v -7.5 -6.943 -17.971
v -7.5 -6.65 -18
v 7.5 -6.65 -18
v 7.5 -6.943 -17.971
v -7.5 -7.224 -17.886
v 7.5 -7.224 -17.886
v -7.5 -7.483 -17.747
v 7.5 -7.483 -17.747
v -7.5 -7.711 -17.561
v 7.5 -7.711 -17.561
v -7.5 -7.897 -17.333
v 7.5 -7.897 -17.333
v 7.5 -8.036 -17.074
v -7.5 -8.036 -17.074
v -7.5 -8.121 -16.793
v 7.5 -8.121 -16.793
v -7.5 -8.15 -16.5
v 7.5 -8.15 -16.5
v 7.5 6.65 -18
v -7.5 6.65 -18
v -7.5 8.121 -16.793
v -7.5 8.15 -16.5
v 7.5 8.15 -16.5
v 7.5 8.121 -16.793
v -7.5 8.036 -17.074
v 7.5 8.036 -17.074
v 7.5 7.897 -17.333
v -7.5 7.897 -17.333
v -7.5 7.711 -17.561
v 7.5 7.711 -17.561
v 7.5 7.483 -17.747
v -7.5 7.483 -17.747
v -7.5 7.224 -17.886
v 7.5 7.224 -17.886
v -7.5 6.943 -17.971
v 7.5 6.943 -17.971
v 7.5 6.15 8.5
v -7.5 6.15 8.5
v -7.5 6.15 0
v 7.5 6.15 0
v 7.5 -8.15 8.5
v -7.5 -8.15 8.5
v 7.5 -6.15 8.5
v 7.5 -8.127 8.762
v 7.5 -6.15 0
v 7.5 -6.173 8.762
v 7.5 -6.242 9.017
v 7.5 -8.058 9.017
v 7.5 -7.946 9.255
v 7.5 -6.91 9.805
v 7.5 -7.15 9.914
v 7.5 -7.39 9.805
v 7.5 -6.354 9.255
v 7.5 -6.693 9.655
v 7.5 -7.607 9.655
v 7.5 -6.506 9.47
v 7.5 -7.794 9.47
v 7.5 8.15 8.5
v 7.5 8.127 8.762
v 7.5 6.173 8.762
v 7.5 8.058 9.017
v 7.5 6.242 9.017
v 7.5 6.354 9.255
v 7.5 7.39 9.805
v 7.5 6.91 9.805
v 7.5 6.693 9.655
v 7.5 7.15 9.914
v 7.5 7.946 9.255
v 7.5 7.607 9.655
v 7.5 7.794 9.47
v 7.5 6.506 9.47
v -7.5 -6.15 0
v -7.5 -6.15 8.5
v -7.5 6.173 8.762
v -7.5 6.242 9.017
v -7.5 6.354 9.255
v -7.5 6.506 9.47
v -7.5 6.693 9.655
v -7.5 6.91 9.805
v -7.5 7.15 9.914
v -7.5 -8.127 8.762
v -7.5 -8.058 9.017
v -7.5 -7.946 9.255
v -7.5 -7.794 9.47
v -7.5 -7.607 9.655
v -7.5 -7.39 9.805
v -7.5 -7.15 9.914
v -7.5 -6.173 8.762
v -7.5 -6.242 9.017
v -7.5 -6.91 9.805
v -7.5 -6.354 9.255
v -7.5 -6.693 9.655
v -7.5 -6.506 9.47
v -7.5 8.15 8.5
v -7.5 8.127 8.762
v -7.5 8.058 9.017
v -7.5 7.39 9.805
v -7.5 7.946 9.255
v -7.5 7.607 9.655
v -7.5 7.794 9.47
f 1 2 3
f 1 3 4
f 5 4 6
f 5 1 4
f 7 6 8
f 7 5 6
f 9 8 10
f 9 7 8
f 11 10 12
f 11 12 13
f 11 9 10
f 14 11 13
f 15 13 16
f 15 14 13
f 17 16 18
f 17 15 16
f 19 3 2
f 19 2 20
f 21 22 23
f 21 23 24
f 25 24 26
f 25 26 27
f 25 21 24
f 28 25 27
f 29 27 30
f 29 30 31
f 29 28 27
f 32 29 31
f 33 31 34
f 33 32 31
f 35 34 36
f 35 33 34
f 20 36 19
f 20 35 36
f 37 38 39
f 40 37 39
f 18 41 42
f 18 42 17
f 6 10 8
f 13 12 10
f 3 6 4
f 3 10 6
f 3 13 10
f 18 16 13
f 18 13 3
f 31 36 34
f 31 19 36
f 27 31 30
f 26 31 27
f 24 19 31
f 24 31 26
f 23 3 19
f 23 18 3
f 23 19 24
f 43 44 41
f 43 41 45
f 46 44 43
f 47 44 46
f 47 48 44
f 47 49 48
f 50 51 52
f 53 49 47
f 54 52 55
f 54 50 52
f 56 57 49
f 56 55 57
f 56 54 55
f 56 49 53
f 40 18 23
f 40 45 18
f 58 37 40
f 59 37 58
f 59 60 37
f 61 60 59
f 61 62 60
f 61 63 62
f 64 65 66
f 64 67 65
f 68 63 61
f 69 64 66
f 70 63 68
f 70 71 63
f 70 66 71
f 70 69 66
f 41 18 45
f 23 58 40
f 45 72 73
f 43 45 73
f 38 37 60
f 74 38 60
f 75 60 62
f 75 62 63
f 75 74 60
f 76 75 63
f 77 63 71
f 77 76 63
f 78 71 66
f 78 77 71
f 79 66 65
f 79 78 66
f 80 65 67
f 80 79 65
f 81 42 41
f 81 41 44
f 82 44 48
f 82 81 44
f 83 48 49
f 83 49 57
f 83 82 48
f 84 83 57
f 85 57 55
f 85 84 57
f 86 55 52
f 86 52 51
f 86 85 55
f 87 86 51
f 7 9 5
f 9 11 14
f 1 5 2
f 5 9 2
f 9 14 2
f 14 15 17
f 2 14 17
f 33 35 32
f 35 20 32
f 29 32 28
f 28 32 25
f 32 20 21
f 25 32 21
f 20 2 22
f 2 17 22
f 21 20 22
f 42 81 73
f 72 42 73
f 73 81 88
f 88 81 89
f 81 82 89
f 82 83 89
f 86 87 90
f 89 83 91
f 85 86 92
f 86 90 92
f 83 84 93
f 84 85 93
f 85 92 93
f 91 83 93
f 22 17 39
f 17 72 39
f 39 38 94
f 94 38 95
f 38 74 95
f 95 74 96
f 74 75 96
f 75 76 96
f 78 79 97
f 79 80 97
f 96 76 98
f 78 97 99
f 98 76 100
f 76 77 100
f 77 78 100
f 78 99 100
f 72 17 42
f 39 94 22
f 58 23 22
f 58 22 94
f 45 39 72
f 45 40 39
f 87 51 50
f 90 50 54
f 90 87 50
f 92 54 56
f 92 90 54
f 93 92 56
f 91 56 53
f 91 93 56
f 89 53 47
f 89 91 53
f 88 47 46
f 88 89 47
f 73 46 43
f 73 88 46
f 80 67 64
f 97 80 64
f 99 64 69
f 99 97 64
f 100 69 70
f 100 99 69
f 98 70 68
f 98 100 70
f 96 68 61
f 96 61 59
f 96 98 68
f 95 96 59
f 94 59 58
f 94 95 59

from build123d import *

# Parameters (mm, degrees)
F1_DEPTH    = 7.5
F2_T1_DEPTH = 22.5


# Not quite as in the source:
# - a fillet or chamfer that OpenCascade refuses, or shapes differently, is made with other operations: its cross-section is extruded or revolved along the edge and cut away or added


with BuildPart() as f1:
    # F0 (on Right) → F1 (new body, symmetric)
    with BuildSketch(Plane.YZ):
        Polygon((6.15, 0), (0, 0), (-6.15, 0), (-6.15, 10), (-8.15, 10), (-8.15, -18), (0, -18), (8.15, -18), (8.15, 10), (6.15, 10), align=None)
    extrude(amount=F1_DEPTH, both=True)

    # F2: fillet of radius 1.5 on 6 edges, made by hand

    # F2_s2 → F2_t1 (cut)
    with BuildSketch(Plane.YZ.offset(-11.25)):
        with BuildLine():
            ThreePointArc((-8.15, 8.5), (-7.7106601718, 9.5606601718), (-6.65, 10))
            Line((-6.65, 10), (-8.15, 10))
            Line((-8.15, 10), (-8.15, 8.5))
        make_face()
        with BuildLine():
            ThreePointArc((-7.65, 10), (-6.5893398282, 9.5606601718), (-6.15, 8.5))
            Line((-6.15, 8.5), (-6.15, 10))
            Line((-6.15, 10), (-7.65, 10))
        make_face()
        with BuildLine():
            ThreePointArc((6.15, 8.5), (6.5893398282, 9.5606601718), (7.65, 10))
            Line((7.65, 10), (6.15, 10))
            Line((6.15, 10), (6.15, 8.5))
        make_face()
        with BuildLine():
            ThreePointArc((6.65, 10), (7.7106601718, 9.5606601718), (8.15, 8.5))
            Line((8.15, 8.5), (8.15, 10))
            Line((8.15, 10), (6.65, 10))
        make_face()
        with BuildLine():
            ThreePointArc((-6.65, -18), (-7.7106601718, -17.5606601718), (-8.15, -16.5))
            Line((-8.15, -16.5), (-8.15, -18))
            Line((-8.15, -18), (-6.65, -18))
        make_face()
        with BuildLine():
            ThreePointArc((8.15, -16.5), (7.7106601718, -17.5606601718), (6.65, -18))
            Line((6.65, -18), (8.15, -18))
            Line((8.15, -18), (8.15, -16.5))
        make_face()
    extrude(amount=F2_T1_DEPTH, mode=Mode.SUBTRACT)


solid = f1.part
